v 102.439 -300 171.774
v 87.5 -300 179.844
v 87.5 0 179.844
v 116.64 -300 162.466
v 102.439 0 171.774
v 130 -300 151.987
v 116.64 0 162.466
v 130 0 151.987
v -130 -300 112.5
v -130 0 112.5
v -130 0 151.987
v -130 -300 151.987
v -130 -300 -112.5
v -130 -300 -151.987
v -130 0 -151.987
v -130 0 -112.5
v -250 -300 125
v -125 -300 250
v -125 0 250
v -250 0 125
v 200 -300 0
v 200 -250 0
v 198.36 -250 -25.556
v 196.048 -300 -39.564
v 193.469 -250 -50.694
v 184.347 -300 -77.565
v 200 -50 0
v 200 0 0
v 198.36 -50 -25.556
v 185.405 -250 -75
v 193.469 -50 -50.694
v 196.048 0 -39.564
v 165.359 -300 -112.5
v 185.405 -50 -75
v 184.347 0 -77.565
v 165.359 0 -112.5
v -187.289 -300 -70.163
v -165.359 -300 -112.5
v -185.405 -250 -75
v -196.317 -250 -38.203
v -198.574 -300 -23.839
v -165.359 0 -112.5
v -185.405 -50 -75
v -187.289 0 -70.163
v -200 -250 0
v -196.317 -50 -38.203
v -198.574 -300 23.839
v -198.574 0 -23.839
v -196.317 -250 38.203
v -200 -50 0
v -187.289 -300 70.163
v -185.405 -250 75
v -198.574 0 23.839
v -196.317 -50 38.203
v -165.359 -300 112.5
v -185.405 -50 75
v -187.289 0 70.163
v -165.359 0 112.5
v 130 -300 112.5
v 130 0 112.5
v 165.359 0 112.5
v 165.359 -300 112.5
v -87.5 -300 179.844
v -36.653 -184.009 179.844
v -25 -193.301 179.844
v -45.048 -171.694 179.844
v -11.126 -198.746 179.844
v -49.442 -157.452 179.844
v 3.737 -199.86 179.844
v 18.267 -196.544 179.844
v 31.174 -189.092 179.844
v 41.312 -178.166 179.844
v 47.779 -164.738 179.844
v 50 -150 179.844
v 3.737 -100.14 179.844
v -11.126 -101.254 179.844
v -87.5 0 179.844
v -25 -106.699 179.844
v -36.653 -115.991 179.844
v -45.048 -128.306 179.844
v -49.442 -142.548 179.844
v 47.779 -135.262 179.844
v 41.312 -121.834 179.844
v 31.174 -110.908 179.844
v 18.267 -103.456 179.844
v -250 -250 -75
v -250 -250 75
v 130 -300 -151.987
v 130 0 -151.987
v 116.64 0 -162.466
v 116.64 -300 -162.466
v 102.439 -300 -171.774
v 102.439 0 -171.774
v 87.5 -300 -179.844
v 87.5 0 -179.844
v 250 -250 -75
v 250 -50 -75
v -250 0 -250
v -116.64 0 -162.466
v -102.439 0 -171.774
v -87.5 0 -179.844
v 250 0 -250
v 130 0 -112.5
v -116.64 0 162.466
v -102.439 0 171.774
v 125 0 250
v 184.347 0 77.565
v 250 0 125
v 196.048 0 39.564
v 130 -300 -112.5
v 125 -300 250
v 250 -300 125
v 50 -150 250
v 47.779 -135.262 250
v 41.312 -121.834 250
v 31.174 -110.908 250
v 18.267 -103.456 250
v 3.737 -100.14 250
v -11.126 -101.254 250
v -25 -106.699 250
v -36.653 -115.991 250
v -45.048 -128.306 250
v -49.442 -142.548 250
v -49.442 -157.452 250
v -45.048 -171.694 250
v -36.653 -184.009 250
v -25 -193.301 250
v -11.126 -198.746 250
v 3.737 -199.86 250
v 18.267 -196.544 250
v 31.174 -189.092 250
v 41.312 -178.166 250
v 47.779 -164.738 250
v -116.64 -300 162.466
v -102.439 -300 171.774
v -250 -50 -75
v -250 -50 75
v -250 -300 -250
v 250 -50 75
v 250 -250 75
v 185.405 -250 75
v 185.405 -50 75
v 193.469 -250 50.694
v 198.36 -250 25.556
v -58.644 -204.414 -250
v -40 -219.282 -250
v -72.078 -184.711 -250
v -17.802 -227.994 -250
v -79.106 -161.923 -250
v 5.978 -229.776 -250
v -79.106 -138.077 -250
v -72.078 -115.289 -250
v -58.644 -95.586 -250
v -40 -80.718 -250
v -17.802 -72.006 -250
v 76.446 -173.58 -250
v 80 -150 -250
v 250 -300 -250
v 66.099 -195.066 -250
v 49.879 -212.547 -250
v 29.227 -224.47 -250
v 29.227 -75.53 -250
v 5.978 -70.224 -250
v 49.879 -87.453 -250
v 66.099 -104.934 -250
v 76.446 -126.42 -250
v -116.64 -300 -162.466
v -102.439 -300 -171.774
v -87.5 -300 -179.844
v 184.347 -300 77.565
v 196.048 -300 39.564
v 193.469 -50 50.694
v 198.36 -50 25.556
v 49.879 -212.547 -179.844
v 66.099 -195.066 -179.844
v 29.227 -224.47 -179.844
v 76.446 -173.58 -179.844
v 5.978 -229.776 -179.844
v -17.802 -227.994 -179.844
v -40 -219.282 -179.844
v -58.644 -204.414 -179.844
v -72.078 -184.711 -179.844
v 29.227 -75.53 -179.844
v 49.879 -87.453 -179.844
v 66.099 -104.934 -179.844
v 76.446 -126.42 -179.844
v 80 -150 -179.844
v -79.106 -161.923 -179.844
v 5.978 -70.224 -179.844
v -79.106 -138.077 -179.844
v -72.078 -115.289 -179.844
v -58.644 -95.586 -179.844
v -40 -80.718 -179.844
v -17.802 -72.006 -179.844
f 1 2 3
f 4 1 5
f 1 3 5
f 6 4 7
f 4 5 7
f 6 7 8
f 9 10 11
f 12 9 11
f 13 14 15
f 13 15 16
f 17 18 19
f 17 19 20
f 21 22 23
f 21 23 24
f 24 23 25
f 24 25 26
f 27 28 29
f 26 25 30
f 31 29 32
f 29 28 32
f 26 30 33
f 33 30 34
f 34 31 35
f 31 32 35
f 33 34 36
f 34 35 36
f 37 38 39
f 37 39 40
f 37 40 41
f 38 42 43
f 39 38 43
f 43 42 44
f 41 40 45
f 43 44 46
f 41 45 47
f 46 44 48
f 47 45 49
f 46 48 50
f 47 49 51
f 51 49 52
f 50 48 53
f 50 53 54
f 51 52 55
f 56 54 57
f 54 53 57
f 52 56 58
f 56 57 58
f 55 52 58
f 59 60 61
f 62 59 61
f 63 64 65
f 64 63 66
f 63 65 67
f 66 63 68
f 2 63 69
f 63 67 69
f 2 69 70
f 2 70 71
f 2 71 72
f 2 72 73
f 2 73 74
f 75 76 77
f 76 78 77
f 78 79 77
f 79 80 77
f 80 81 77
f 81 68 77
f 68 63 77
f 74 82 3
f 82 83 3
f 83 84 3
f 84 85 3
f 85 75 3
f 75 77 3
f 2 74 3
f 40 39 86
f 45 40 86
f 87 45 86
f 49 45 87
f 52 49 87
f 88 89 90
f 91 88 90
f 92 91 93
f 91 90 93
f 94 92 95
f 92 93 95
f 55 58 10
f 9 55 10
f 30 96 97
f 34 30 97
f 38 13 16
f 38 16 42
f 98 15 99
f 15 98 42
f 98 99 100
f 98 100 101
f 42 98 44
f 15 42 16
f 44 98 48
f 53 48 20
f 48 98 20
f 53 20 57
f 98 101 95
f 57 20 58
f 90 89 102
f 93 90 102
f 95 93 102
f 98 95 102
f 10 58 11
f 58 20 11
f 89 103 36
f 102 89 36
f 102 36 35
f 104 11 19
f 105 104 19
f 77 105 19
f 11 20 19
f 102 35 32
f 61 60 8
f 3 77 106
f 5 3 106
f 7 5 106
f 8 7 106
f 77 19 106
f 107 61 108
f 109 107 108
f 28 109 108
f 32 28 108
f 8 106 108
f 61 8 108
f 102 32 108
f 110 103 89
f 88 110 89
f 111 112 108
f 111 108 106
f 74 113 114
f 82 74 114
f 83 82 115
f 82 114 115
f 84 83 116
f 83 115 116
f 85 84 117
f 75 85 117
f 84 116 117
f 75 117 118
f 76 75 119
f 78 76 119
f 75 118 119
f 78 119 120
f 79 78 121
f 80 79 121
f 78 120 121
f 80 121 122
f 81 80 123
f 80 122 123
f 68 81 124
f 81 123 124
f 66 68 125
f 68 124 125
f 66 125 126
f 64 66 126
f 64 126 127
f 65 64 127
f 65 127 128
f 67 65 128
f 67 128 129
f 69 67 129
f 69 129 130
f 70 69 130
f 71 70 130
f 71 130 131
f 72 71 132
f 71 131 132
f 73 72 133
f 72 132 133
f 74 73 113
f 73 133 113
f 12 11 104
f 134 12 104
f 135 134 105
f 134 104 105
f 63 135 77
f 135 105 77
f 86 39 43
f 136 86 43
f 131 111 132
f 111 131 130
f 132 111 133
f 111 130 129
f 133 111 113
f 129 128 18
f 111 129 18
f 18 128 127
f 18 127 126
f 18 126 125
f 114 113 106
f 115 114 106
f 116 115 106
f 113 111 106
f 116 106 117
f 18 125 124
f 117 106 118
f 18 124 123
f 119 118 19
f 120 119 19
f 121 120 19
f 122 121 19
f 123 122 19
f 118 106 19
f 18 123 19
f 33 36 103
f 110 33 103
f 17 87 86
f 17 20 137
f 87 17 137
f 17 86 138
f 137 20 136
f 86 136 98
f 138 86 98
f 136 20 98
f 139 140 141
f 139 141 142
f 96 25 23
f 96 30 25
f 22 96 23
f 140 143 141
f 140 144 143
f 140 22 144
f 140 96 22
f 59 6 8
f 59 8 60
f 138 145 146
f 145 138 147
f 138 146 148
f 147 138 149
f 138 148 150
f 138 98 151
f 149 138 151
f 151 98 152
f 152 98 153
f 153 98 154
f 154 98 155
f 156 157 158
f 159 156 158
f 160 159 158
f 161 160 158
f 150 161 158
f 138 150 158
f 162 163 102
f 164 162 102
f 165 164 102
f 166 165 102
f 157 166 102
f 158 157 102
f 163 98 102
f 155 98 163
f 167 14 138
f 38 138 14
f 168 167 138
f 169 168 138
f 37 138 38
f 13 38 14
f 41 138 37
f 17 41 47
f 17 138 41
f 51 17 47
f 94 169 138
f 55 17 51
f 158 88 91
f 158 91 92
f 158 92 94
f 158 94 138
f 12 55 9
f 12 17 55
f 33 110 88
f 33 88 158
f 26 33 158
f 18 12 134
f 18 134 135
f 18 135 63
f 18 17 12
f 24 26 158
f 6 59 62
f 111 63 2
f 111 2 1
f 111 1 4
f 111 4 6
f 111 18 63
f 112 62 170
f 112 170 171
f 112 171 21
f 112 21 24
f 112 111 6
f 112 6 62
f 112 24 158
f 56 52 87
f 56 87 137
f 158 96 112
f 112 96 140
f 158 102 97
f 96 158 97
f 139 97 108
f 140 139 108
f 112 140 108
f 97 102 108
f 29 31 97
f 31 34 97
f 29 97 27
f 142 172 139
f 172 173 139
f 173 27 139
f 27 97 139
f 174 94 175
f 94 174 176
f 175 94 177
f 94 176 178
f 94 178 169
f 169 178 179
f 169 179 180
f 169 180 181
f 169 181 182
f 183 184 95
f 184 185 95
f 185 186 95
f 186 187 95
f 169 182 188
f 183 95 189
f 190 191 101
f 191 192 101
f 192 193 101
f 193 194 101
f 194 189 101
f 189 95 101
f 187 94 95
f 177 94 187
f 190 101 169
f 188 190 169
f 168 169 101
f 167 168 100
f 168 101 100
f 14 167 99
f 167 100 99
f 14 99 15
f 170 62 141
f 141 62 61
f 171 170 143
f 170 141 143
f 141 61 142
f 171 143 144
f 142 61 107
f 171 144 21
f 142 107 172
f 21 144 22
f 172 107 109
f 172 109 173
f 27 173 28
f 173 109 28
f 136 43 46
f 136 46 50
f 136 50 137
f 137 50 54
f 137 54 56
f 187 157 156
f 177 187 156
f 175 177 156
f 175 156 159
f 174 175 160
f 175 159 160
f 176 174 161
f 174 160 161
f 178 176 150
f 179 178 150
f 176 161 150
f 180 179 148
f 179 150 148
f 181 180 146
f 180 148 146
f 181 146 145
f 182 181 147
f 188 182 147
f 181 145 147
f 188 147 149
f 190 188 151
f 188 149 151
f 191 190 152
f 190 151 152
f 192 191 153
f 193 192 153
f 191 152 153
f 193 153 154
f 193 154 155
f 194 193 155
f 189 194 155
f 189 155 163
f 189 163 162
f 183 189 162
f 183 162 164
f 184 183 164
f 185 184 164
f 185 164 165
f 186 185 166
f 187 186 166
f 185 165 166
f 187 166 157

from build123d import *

# Parameters (mm, degrees)
F1_DEPTH = 300
F2_R     = 50
F3_DEPTH = 70.156318
F4_R     = 80
F5_DEPTH = 70.156318
F6_W     = 200
F6_H     = 150
F7_DEPTH = 500.001


with BuildPart() as f1:
    # F0 (on Front) → F1 (new body)
    with BuildSketch(Plane.XZ):
        Polygon((-250, -250), (250, -250), (250, 125), (125, 250), (-125, 250), (-250, 125), align=None)
        with BuildLine():
            ThreePointArc((165.359457, 112.5), (191.143783, 58.856217), (200, 0))
            ThreePointArc((200, 0), (191.143783, -58.856217), (165.359457, -112.5))
            ThreePointArc((165.359457, -112.5), (148.99364, -133.419995), (130, -151.986842))
            ThreePointArc((130, -151.986842), (109.63833, -167.270549), (87.5, -179.843682))
            ThreePointArc((87.5, -179.843682), (0, -200), (-87.5, -179.843682))
            ThreePointArc((-87.5, -179.843682), (-109.63833, -167.270549), (-130, -151.986842))
            ThreePointArc((-130, -151.986842), (-148.99364, -133.419995), (-165.359457, -112.5))
            ThreePointArc((-165.359457, -112.5), (-200, 0), (-165.359457, 112.5))
            ThreePointArc((-165.359457, 112.5), (-148.99364, 133.419995), (-130, 151.986842))
            ThreePointArc((-130, 151.986842), (-109.63833, 167.270549), (-87.5, 179.843682))
            ThreePointArc((-87.5, 179.843682), (0, 200), (87.5, 179.843682))
            ThreePointArc((87.5, 179.843682), (109.63833, 167.270549), (130, 151.986842))
            ThreePointArc((130, 151.986842), (148.99364, 133.419995), (165.359457, 112.5))
        make_face(mode=Mode.SUBTRACT)
        with BuildLine():
            Line((-130, 112.5), (-130, 151.986842))
            ThreePointArc((-130, 151.986842), (-148.99364, 133.419995), (-165.359457, 112.5))
            Line((-165.359457, 112.5), (-130, 112.5))
        make_face()
        with BuildLine():
            Line((-87.5, 179.843682), (87.5, 179.843682))
            ThreePointArc((87.5, 179.843682), (0, 200), (-87.5, 179.843682))
        make_face()
        with BuildLine():
            Line((130, 112.5), (165.359457, 112.5))
            ThreePointArc((165.359457, 112.5), (148.99364, 133.419995), (130, 151.986842))
            Line((130, 151.986842), (130, 112.5))
        make_face()
        with BuildLine():
            ThreePointArc((130, -151.986842), (148.99364, -133.419995), (165.359457, -112.5))
            Line((165.359457, -112.5), (130, -112.5))
            Line((130, -112.5), (130, -151.986842))
        make_face()
        with BuildLine():
            ThreePointArc((-87.5, -179.843682), (0, -200), (87.5, -179.843682))
            Line((87.5, -179.843682), (-87.5, -179.843682))
        make_face()
        with BuildLine():
            ThreePointArc((-165.359457, -112.5), (-148.99364, -133.419995), (-130, -151.986842))
            Line((-130, -151.986842), (-130, -112.5))
            Line((-130, -112.5), (-165.359457, -112.5))
        make_face()
    extrude(amount=F1_DEPTH)

    # F2 (on face) → F3 (cut, through all)
    with BuildSketch(Plane.XY.offset(250)):
        with Locations((0, -150)):
            Circle(F2_R)
    extrude(amount=-F3_DEPTH, mode=Mode.SUBTRACT)

    # F4 (on face) → F5 (cut, through all)
    with BuildSketch(Plane(origin=(0, 0, -250), x_dir=(1, 0, 0), z_dir=(0, 0, -1))):
        with Locations((0, 150)):
            Circle(F4_R)
    extrude(amount=-F5_DEPTH, mode=Mode.SUBTRACT)

    # F6 (on face) → F7 (cut, through all)
    with BuildSketch(Plane.YZ.offset(250)):
        with Locations((-150, 0)):
            Rectangle(F6_W, F6_H)
    extrude(amount=-F7_DEPTH, mode=Mode.SUBTRACT)


solid = f1.part
